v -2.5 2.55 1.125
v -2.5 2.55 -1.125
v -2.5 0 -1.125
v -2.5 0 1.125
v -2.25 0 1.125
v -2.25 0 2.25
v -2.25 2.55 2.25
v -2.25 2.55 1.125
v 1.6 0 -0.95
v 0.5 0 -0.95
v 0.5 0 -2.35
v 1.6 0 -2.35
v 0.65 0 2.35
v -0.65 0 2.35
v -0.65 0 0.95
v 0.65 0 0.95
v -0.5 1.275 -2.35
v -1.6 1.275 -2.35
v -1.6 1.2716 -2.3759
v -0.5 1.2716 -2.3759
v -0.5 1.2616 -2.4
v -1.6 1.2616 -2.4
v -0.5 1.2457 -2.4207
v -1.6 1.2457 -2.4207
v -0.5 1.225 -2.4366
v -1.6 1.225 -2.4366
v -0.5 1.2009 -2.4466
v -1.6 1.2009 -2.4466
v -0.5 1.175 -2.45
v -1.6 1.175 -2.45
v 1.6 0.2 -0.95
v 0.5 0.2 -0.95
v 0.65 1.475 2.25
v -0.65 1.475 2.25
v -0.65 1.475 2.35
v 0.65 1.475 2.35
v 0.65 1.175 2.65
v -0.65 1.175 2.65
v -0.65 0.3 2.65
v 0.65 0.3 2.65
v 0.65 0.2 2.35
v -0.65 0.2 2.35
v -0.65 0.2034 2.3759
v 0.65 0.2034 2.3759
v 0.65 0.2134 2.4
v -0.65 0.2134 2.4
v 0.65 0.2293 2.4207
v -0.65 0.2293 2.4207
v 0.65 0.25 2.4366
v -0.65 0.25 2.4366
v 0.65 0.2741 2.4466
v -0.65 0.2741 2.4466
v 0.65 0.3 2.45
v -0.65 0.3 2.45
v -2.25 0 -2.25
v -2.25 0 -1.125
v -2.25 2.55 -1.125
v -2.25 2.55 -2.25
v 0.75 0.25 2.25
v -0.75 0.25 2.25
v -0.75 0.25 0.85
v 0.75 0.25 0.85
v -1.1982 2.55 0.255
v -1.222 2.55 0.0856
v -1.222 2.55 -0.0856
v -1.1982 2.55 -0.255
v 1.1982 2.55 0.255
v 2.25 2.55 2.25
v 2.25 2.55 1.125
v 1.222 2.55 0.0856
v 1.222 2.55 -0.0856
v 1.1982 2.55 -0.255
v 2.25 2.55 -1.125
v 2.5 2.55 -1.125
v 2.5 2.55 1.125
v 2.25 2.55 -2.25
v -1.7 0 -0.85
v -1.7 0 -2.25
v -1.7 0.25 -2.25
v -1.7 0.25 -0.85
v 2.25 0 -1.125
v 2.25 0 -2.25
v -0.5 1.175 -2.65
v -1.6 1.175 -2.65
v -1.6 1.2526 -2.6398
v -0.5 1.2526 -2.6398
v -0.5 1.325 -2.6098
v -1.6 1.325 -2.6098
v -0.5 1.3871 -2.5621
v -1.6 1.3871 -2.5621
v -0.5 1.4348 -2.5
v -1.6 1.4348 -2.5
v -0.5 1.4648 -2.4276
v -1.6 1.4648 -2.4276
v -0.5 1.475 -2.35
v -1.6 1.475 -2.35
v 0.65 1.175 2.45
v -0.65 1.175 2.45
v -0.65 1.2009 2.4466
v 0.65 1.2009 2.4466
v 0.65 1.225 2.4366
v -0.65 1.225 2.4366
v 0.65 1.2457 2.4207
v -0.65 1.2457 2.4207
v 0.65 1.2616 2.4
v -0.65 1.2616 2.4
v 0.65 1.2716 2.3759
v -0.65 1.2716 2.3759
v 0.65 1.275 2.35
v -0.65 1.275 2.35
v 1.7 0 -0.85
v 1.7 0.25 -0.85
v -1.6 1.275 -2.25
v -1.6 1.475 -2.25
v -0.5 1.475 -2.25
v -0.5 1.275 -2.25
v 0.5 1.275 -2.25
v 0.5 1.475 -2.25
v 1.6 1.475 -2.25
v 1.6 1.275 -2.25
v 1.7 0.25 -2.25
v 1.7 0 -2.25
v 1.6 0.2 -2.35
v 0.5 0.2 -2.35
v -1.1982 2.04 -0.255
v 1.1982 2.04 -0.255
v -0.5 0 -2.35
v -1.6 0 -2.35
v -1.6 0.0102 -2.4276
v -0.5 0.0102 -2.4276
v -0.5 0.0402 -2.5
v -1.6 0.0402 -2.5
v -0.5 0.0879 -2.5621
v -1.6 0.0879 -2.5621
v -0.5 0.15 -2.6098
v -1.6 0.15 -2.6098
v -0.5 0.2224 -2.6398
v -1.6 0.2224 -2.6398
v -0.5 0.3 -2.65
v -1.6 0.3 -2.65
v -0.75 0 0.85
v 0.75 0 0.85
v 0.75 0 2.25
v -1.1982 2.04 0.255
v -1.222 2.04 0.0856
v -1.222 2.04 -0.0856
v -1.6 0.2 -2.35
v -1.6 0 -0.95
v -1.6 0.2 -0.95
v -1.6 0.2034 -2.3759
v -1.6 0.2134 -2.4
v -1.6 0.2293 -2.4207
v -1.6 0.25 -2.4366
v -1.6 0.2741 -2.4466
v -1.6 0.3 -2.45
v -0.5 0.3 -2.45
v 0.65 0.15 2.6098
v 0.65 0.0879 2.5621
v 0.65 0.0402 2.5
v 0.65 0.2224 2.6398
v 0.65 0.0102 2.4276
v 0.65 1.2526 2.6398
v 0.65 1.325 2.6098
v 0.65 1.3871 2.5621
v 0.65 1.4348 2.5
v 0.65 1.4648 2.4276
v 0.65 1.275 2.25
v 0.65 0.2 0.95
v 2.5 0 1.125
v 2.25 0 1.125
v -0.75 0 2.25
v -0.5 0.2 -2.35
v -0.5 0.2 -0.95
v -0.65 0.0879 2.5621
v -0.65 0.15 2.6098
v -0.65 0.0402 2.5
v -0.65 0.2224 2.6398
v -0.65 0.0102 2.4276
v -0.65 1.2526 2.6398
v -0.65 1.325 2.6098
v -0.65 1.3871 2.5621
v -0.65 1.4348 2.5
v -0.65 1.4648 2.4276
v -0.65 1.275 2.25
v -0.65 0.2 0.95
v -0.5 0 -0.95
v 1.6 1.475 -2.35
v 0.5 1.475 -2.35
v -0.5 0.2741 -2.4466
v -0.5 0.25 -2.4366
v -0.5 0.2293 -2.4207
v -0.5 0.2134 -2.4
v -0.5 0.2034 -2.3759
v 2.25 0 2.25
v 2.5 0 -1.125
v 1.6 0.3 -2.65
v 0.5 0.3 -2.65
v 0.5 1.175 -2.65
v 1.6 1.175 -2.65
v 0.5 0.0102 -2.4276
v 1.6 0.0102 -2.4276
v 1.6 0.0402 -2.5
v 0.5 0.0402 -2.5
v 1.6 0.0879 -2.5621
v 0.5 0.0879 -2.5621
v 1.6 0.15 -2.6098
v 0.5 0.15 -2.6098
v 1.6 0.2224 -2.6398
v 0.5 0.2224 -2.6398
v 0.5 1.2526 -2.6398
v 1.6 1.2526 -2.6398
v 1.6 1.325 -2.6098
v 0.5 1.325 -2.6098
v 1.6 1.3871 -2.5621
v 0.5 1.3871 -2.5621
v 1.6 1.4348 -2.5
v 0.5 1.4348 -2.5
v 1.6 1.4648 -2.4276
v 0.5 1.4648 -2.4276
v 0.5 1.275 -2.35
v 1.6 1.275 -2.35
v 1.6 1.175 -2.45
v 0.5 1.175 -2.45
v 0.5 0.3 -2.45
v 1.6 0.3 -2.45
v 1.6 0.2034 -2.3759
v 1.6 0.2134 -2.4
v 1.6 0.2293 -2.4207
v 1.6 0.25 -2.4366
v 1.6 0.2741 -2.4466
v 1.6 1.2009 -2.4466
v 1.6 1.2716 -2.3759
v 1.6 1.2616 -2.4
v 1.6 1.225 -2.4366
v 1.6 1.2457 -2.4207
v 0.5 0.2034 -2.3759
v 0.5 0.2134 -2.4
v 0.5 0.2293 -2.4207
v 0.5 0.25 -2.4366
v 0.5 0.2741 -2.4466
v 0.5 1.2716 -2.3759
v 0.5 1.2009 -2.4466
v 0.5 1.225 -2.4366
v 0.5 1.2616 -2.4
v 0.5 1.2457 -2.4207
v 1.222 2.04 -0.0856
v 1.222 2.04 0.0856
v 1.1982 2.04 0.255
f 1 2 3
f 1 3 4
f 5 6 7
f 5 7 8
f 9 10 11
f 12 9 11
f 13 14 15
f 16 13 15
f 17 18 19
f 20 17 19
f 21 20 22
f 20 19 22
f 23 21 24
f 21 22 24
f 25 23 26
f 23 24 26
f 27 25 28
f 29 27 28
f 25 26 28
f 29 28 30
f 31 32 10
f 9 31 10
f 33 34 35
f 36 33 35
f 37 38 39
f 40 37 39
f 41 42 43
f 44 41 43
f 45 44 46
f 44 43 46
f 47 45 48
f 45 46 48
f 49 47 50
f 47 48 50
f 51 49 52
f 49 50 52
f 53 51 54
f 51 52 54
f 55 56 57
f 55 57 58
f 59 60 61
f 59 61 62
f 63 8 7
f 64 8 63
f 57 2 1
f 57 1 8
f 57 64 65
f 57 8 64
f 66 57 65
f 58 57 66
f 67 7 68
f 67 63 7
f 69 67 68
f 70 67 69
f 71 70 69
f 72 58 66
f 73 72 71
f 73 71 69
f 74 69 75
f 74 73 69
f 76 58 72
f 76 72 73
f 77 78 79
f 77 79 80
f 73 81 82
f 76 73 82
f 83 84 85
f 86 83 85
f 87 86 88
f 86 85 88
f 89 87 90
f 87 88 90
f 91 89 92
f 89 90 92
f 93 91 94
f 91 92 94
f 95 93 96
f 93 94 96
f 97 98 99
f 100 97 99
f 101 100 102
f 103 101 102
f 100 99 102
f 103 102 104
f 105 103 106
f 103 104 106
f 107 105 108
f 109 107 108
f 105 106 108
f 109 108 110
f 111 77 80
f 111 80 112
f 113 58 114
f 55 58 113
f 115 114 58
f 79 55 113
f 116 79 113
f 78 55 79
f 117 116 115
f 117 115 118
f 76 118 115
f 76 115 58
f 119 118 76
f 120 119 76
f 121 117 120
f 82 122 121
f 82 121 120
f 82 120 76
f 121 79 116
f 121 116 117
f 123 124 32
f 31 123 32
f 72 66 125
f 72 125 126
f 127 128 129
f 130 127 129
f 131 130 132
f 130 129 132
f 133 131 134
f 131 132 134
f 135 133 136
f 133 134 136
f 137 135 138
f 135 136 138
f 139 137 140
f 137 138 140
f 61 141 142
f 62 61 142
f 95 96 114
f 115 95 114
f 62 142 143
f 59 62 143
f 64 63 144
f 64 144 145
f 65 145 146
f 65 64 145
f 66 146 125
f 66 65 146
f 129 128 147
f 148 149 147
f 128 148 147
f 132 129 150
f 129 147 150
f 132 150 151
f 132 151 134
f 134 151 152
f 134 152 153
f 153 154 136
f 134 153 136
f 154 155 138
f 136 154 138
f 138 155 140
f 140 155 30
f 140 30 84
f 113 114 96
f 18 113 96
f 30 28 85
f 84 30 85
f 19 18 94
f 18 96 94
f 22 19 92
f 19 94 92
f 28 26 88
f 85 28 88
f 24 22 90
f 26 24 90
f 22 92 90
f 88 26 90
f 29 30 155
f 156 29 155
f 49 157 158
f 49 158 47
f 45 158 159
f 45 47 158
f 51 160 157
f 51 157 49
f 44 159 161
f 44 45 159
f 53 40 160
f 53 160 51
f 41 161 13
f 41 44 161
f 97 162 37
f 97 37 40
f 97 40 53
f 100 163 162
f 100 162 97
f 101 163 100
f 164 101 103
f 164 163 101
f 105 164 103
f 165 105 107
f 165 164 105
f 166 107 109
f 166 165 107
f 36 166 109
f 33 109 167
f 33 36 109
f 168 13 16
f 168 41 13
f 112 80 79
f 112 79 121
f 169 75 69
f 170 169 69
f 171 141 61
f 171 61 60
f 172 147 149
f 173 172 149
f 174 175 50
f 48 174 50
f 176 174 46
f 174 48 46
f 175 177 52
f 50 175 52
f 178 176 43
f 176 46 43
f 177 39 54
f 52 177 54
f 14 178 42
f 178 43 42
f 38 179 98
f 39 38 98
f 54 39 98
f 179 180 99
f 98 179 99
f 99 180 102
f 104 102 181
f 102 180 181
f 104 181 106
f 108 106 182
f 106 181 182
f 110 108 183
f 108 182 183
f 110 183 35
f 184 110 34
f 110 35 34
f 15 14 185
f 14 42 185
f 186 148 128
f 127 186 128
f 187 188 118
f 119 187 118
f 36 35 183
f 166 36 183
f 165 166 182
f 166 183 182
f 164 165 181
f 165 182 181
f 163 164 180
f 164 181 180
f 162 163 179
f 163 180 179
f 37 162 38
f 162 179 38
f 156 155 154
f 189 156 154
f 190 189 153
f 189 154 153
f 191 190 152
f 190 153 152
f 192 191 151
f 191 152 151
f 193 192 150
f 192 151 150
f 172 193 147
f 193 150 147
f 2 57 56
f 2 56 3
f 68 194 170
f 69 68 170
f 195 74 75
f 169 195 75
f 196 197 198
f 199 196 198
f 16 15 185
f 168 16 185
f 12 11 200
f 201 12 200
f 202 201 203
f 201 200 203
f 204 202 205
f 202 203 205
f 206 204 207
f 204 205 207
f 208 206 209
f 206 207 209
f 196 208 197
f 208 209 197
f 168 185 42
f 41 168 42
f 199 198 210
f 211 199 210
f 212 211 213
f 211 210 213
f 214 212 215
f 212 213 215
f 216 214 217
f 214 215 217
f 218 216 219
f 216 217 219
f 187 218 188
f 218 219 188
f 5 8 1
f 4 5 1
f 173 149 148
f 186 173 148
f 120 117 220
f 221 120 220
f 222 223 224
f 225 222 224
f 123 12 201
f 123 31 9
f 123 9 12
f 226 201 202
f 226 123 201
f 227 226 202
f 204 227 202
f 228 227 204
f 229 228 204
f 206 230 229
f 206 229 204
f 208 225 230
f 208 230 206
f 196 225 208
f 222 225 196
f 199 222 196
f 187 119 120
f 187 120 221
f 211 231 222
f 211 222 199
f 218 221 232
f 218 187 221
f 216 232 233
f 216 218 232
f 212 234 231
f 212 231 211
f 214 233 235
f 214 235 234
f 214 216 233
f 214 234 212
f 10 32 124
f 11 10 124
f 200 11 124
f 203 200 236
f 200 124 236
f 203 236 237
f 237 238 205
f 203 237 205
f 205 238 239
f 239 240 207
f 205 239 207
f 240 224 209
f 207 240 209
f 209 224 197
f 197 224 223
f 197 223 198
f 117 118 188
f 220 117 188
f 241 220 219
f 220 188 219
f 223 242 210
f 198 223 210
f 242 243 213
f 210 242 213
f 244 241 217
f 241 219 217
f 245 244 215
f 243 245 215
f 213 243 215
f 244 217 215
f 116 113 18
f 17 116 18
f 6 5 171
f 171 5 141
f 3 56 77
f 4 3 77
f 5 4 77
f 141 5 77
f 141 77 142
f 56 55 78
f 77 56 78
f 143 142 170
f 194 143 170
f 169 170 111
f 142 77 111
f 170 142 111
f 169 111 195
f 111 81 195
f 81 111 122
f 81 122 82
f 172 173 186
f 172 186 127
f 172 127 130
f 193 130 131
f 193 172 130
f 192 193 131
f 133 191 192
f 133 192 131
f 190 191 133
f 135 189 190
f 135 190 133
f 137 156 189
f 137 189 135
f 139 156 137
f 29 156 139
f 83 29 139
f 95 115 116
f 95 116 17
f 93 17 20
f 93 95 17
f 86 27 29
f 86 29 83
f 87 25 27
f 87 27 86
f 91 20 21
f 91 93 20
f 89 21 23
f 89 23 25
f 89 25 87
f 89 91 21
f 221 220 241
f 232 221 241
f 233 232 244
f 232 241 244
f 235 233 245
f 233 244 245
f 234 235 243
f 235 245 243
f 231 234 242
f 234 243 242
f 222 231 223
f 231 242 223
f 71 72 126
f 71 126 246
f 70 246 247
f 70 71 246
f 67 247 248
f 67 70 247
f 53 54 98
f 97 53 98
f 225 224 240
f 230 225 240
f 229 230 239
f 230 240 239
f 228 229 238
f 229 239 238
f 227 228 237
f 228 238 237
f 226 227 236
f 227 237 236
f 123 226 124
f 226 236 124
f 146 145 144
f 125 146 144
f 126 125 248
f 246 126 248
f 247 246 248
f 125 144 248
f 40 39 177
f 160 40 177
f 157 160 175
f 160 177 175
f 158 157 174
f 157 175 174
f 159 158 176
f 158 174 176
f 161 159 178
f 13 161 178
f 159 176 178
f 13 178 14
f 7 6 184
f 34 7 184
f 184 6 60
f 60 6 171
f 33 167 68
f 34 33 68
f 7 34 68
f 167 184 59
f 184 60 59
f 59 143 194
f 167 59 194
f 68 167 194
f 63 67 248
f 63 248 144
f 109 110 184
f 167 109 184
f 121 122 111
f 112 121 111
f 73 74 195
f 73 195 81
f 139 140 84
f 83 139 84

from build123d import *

# Parameters (mm, degrees)
SKETCH1_W                        = 4.5
SKETCH1_H                        = 4.5
BASE_EXTRUDE_DEPTH               = 2.55
SKETCH2_W                        = 0.25
SKETCH2_H                        = 2.25
EARS_EXTRUDE1_DEPTH              = 2.55
SKETCH9_W                        = 3.4
SKETCH9_H                        = 1.4
SKETCH9_W_2                      = 1.5
RELIEF_CUT_BTM_DEPTH             = 0.25
DOUBLE_START                     = -1.6
DOUBLE_FEET_EXTRUDE_THIN1_DEPTH  = 3.2
SINGLE_START                     = -0.65
SINGLE_FOOT_EXTRUDE_THIN2_DEPTH  = 1.3
REMOVE_MIDDLE_OF_FEET_DEPTH      = 0.5
SCREW_DRIVER_SLOT_EXTRUDE2_DEPTH = 0.51


# Read off the part's stored shape, not the designer's step: double feet-Extrude-Thin1, single foot-Extrude-Thin2
with BuildPart() as part:
    # Sketch1 → Base-Extrude (new body)
    with BuildSketch(Plane(origin=(0, 0, 0), x_dir=(1, 0, 0), z_dir=(0, 1, 0))):
        Rectangle(SKETCH1_W, SKETCH1_H)
    extrude(amount=BASE_EXTRUDE_DEPTH)

    # Sketch2 → ears-Extrude1 (add, through all)
    with BuildSketch(Plane(origin=(0, 2.55, 0), x_dir=(-1, 0, 0), z_dir=(0, 1, 0))):
        with Locations((-2.375, 0)):
            Rectangle(SKETCH2_W, SKETCH2_H)
        with Locations((2.375, 0)):
            Rectangle(SKETCH2_W, SKETCH2_H)
    extrude(amount=-EARS_EXTRUDE1_DEPTH)

    # Sketch9 → relief-cut-btm (cut)
    with BuildSketch(Plane.XZ):
        with Locations((0, -1.55)):
            Rectangle(SKETCH9_W, SKETCH9_H)
        with Locations((0, 1.55)):
            Rectangle(SKETCH9_W_2, SKETCH9_H)
    extrude(amount=-RELIEF_CUT_BTM_DEPTH, mode=Mode.SUBTRACT)

    # double feet-Extrude-Thin1 outline → double feet-Extrude-Thin1 (add)
    with BuildSketch(Plane(origin=(0, 0, 0), x_dir=(0, 0, -1), z_dir=(1, 0, 0)).offset(DOUBLE_START)):
        with BuildLine():
            ThreePointArc((2.35, 0), (2.562132034, 0.087867966), (2.65, 0.3))
            Line((2.65, 0.3), (2.65, 1.175))
            ThreePointArc((2.65, 1.175), (2.562132034, 1.387132034), (2.35, 1.475))
            Line((2.35, 1.475), (2.25, 1.475))
            Line((2.25, 1.475), (2.25, 1.275))
            Line((2.25, 1.275), (2.35, 1.275))
            ThreePointArc((2.35, 1.275), (2.420710678, 1.245710678), (2.45, 1.175))
            Line((2.45, 1.175), (2.45, 0.3))
            ThreePointArc((2.45, 0.3), (2.420710678, 0.229289322), (2.35, 0.2))
            Line((2.35, 0.2), (0.95, 0.2))
            Line((0.95, 0.2), (0.95, 0))
            Line((0.95, 0), (2.35, 0))
        make_face()
    extrude(amount=DOUBLE_FEET_EXTRUDE_THIN1_DEPTH)

    # single foot-Extrude-Thin2 outline → single foot-Extrude-Thin2 (add)
    with BuildSketch(Plane(origin=(0, 0, 0), x_dir=(0, 0, -1), z_dir=(1, 0, 0)).offset(SINGLE_START)):
        with BuildLine():
            ThreePointArc((-2.65, 0.3), (-2.562132034, 0.087867966), (-2.35, 0))
            Line((-2.35, 0), (-0.95, 0))
            Line((-0.95, 0), (-0.95, 0.2))
            Line((-0.95, 0.2), (-2.35, 0.2))
            ThreePointArc((-2.35, 0.2), (-2.420710678, 0.229289322), (-2.45, 0.3))
            Line((-2.45, 0.3), (-2.45, 1.175))
            ThreePointArc((-2.45, 1.175), (-2.420710678, 1.245710678), (-2.35, 1.275))
            Line((-2.35, 1.275), (-2.25, 1.275))
            Line((-2.25, 1.275), (-2.25, 1.475))
            Line((-2.25, 1.475), (-2.35, 1.475))
            ThreePointArc((-2.35, 1.475), (-2.562132034, 1.387132034), (-2.65, 1.175))
            Line((-2.65, 1.175), (-2.65, 0.3))
        make_face()
    extrude(amount=SINGLE_FOOT_EXTRUDE_THIN2_DEPTH)

    # Sketch10 → remove-middle-of-feet (cut, symmetric)
    with BuildSketch(Plane(origin=(0, 0, 0), x_dir=(0, 0, -1), z_dir=(1, 0, 0))):
        with BuildLine():
            Line((2.35, 1.475), (2.25, 1.475))
            Line((2.25, 1.475), (2.25, 1.275))
            Line((2.25, 1.275), (2.35, 1.275))
            ThreePointArc((2.35, 1.275), (2.420710678, 1.245710678), (2.45, 1.175))
            Line((2.45, 1.175), (2.45, 0.3))
            ThreePointArc((2.45, 0.3), (2.420710678, 0.229289322), (2.35, 0.2))
            Line((2.35, 0.2), (0.95, 0.2))
            Line((0.95, 0.2), (0.95, 0))
            Line((0.95, 0), (2.35, 0))
            ThreePointArc((2.35, 0), (2.562132034, 0.087867966), (2.65, 0.3))
            Line((2.65, 0.3), (2.65, 1.175))
            ThreePointArc((2.65, 1.175), (2.562132034, 1.387132034), (2.35, 1.475))
        make_face()
    extrude(amount=REMOVE_MIDDLE_OF_FEET_DEPTH, both=True, mode=Mode.SUBTRACT)

    # Sketch7 → screw driver slot-Extrude2 (cut)
    with BuildSketch(Plane(origin=(0, 2.55, 0), x_dir=(-1, 0, 0), z_dir=(0, 1, 0))):
        with BuildLine():
            Line((-1.198165264, 0.255), (1.198165264, 0.255))
            ThreePointArc((1.198165264, 0.255), (1.225, 0), (1.198165264, -0.255))
            Line((1.198165264, -0.255), (-1.198165264, -0.255))
            ThreePointArc((-1.198165264, -0.255), (-1.225, 0), (-1.198165264, 0.255))
        make_face()
    extrude(amount=-SCREW_DRIVER_SLOT_EXTRUDE2_DEPTH, mode=Mode.SUBTRACT)


solid = part.part
